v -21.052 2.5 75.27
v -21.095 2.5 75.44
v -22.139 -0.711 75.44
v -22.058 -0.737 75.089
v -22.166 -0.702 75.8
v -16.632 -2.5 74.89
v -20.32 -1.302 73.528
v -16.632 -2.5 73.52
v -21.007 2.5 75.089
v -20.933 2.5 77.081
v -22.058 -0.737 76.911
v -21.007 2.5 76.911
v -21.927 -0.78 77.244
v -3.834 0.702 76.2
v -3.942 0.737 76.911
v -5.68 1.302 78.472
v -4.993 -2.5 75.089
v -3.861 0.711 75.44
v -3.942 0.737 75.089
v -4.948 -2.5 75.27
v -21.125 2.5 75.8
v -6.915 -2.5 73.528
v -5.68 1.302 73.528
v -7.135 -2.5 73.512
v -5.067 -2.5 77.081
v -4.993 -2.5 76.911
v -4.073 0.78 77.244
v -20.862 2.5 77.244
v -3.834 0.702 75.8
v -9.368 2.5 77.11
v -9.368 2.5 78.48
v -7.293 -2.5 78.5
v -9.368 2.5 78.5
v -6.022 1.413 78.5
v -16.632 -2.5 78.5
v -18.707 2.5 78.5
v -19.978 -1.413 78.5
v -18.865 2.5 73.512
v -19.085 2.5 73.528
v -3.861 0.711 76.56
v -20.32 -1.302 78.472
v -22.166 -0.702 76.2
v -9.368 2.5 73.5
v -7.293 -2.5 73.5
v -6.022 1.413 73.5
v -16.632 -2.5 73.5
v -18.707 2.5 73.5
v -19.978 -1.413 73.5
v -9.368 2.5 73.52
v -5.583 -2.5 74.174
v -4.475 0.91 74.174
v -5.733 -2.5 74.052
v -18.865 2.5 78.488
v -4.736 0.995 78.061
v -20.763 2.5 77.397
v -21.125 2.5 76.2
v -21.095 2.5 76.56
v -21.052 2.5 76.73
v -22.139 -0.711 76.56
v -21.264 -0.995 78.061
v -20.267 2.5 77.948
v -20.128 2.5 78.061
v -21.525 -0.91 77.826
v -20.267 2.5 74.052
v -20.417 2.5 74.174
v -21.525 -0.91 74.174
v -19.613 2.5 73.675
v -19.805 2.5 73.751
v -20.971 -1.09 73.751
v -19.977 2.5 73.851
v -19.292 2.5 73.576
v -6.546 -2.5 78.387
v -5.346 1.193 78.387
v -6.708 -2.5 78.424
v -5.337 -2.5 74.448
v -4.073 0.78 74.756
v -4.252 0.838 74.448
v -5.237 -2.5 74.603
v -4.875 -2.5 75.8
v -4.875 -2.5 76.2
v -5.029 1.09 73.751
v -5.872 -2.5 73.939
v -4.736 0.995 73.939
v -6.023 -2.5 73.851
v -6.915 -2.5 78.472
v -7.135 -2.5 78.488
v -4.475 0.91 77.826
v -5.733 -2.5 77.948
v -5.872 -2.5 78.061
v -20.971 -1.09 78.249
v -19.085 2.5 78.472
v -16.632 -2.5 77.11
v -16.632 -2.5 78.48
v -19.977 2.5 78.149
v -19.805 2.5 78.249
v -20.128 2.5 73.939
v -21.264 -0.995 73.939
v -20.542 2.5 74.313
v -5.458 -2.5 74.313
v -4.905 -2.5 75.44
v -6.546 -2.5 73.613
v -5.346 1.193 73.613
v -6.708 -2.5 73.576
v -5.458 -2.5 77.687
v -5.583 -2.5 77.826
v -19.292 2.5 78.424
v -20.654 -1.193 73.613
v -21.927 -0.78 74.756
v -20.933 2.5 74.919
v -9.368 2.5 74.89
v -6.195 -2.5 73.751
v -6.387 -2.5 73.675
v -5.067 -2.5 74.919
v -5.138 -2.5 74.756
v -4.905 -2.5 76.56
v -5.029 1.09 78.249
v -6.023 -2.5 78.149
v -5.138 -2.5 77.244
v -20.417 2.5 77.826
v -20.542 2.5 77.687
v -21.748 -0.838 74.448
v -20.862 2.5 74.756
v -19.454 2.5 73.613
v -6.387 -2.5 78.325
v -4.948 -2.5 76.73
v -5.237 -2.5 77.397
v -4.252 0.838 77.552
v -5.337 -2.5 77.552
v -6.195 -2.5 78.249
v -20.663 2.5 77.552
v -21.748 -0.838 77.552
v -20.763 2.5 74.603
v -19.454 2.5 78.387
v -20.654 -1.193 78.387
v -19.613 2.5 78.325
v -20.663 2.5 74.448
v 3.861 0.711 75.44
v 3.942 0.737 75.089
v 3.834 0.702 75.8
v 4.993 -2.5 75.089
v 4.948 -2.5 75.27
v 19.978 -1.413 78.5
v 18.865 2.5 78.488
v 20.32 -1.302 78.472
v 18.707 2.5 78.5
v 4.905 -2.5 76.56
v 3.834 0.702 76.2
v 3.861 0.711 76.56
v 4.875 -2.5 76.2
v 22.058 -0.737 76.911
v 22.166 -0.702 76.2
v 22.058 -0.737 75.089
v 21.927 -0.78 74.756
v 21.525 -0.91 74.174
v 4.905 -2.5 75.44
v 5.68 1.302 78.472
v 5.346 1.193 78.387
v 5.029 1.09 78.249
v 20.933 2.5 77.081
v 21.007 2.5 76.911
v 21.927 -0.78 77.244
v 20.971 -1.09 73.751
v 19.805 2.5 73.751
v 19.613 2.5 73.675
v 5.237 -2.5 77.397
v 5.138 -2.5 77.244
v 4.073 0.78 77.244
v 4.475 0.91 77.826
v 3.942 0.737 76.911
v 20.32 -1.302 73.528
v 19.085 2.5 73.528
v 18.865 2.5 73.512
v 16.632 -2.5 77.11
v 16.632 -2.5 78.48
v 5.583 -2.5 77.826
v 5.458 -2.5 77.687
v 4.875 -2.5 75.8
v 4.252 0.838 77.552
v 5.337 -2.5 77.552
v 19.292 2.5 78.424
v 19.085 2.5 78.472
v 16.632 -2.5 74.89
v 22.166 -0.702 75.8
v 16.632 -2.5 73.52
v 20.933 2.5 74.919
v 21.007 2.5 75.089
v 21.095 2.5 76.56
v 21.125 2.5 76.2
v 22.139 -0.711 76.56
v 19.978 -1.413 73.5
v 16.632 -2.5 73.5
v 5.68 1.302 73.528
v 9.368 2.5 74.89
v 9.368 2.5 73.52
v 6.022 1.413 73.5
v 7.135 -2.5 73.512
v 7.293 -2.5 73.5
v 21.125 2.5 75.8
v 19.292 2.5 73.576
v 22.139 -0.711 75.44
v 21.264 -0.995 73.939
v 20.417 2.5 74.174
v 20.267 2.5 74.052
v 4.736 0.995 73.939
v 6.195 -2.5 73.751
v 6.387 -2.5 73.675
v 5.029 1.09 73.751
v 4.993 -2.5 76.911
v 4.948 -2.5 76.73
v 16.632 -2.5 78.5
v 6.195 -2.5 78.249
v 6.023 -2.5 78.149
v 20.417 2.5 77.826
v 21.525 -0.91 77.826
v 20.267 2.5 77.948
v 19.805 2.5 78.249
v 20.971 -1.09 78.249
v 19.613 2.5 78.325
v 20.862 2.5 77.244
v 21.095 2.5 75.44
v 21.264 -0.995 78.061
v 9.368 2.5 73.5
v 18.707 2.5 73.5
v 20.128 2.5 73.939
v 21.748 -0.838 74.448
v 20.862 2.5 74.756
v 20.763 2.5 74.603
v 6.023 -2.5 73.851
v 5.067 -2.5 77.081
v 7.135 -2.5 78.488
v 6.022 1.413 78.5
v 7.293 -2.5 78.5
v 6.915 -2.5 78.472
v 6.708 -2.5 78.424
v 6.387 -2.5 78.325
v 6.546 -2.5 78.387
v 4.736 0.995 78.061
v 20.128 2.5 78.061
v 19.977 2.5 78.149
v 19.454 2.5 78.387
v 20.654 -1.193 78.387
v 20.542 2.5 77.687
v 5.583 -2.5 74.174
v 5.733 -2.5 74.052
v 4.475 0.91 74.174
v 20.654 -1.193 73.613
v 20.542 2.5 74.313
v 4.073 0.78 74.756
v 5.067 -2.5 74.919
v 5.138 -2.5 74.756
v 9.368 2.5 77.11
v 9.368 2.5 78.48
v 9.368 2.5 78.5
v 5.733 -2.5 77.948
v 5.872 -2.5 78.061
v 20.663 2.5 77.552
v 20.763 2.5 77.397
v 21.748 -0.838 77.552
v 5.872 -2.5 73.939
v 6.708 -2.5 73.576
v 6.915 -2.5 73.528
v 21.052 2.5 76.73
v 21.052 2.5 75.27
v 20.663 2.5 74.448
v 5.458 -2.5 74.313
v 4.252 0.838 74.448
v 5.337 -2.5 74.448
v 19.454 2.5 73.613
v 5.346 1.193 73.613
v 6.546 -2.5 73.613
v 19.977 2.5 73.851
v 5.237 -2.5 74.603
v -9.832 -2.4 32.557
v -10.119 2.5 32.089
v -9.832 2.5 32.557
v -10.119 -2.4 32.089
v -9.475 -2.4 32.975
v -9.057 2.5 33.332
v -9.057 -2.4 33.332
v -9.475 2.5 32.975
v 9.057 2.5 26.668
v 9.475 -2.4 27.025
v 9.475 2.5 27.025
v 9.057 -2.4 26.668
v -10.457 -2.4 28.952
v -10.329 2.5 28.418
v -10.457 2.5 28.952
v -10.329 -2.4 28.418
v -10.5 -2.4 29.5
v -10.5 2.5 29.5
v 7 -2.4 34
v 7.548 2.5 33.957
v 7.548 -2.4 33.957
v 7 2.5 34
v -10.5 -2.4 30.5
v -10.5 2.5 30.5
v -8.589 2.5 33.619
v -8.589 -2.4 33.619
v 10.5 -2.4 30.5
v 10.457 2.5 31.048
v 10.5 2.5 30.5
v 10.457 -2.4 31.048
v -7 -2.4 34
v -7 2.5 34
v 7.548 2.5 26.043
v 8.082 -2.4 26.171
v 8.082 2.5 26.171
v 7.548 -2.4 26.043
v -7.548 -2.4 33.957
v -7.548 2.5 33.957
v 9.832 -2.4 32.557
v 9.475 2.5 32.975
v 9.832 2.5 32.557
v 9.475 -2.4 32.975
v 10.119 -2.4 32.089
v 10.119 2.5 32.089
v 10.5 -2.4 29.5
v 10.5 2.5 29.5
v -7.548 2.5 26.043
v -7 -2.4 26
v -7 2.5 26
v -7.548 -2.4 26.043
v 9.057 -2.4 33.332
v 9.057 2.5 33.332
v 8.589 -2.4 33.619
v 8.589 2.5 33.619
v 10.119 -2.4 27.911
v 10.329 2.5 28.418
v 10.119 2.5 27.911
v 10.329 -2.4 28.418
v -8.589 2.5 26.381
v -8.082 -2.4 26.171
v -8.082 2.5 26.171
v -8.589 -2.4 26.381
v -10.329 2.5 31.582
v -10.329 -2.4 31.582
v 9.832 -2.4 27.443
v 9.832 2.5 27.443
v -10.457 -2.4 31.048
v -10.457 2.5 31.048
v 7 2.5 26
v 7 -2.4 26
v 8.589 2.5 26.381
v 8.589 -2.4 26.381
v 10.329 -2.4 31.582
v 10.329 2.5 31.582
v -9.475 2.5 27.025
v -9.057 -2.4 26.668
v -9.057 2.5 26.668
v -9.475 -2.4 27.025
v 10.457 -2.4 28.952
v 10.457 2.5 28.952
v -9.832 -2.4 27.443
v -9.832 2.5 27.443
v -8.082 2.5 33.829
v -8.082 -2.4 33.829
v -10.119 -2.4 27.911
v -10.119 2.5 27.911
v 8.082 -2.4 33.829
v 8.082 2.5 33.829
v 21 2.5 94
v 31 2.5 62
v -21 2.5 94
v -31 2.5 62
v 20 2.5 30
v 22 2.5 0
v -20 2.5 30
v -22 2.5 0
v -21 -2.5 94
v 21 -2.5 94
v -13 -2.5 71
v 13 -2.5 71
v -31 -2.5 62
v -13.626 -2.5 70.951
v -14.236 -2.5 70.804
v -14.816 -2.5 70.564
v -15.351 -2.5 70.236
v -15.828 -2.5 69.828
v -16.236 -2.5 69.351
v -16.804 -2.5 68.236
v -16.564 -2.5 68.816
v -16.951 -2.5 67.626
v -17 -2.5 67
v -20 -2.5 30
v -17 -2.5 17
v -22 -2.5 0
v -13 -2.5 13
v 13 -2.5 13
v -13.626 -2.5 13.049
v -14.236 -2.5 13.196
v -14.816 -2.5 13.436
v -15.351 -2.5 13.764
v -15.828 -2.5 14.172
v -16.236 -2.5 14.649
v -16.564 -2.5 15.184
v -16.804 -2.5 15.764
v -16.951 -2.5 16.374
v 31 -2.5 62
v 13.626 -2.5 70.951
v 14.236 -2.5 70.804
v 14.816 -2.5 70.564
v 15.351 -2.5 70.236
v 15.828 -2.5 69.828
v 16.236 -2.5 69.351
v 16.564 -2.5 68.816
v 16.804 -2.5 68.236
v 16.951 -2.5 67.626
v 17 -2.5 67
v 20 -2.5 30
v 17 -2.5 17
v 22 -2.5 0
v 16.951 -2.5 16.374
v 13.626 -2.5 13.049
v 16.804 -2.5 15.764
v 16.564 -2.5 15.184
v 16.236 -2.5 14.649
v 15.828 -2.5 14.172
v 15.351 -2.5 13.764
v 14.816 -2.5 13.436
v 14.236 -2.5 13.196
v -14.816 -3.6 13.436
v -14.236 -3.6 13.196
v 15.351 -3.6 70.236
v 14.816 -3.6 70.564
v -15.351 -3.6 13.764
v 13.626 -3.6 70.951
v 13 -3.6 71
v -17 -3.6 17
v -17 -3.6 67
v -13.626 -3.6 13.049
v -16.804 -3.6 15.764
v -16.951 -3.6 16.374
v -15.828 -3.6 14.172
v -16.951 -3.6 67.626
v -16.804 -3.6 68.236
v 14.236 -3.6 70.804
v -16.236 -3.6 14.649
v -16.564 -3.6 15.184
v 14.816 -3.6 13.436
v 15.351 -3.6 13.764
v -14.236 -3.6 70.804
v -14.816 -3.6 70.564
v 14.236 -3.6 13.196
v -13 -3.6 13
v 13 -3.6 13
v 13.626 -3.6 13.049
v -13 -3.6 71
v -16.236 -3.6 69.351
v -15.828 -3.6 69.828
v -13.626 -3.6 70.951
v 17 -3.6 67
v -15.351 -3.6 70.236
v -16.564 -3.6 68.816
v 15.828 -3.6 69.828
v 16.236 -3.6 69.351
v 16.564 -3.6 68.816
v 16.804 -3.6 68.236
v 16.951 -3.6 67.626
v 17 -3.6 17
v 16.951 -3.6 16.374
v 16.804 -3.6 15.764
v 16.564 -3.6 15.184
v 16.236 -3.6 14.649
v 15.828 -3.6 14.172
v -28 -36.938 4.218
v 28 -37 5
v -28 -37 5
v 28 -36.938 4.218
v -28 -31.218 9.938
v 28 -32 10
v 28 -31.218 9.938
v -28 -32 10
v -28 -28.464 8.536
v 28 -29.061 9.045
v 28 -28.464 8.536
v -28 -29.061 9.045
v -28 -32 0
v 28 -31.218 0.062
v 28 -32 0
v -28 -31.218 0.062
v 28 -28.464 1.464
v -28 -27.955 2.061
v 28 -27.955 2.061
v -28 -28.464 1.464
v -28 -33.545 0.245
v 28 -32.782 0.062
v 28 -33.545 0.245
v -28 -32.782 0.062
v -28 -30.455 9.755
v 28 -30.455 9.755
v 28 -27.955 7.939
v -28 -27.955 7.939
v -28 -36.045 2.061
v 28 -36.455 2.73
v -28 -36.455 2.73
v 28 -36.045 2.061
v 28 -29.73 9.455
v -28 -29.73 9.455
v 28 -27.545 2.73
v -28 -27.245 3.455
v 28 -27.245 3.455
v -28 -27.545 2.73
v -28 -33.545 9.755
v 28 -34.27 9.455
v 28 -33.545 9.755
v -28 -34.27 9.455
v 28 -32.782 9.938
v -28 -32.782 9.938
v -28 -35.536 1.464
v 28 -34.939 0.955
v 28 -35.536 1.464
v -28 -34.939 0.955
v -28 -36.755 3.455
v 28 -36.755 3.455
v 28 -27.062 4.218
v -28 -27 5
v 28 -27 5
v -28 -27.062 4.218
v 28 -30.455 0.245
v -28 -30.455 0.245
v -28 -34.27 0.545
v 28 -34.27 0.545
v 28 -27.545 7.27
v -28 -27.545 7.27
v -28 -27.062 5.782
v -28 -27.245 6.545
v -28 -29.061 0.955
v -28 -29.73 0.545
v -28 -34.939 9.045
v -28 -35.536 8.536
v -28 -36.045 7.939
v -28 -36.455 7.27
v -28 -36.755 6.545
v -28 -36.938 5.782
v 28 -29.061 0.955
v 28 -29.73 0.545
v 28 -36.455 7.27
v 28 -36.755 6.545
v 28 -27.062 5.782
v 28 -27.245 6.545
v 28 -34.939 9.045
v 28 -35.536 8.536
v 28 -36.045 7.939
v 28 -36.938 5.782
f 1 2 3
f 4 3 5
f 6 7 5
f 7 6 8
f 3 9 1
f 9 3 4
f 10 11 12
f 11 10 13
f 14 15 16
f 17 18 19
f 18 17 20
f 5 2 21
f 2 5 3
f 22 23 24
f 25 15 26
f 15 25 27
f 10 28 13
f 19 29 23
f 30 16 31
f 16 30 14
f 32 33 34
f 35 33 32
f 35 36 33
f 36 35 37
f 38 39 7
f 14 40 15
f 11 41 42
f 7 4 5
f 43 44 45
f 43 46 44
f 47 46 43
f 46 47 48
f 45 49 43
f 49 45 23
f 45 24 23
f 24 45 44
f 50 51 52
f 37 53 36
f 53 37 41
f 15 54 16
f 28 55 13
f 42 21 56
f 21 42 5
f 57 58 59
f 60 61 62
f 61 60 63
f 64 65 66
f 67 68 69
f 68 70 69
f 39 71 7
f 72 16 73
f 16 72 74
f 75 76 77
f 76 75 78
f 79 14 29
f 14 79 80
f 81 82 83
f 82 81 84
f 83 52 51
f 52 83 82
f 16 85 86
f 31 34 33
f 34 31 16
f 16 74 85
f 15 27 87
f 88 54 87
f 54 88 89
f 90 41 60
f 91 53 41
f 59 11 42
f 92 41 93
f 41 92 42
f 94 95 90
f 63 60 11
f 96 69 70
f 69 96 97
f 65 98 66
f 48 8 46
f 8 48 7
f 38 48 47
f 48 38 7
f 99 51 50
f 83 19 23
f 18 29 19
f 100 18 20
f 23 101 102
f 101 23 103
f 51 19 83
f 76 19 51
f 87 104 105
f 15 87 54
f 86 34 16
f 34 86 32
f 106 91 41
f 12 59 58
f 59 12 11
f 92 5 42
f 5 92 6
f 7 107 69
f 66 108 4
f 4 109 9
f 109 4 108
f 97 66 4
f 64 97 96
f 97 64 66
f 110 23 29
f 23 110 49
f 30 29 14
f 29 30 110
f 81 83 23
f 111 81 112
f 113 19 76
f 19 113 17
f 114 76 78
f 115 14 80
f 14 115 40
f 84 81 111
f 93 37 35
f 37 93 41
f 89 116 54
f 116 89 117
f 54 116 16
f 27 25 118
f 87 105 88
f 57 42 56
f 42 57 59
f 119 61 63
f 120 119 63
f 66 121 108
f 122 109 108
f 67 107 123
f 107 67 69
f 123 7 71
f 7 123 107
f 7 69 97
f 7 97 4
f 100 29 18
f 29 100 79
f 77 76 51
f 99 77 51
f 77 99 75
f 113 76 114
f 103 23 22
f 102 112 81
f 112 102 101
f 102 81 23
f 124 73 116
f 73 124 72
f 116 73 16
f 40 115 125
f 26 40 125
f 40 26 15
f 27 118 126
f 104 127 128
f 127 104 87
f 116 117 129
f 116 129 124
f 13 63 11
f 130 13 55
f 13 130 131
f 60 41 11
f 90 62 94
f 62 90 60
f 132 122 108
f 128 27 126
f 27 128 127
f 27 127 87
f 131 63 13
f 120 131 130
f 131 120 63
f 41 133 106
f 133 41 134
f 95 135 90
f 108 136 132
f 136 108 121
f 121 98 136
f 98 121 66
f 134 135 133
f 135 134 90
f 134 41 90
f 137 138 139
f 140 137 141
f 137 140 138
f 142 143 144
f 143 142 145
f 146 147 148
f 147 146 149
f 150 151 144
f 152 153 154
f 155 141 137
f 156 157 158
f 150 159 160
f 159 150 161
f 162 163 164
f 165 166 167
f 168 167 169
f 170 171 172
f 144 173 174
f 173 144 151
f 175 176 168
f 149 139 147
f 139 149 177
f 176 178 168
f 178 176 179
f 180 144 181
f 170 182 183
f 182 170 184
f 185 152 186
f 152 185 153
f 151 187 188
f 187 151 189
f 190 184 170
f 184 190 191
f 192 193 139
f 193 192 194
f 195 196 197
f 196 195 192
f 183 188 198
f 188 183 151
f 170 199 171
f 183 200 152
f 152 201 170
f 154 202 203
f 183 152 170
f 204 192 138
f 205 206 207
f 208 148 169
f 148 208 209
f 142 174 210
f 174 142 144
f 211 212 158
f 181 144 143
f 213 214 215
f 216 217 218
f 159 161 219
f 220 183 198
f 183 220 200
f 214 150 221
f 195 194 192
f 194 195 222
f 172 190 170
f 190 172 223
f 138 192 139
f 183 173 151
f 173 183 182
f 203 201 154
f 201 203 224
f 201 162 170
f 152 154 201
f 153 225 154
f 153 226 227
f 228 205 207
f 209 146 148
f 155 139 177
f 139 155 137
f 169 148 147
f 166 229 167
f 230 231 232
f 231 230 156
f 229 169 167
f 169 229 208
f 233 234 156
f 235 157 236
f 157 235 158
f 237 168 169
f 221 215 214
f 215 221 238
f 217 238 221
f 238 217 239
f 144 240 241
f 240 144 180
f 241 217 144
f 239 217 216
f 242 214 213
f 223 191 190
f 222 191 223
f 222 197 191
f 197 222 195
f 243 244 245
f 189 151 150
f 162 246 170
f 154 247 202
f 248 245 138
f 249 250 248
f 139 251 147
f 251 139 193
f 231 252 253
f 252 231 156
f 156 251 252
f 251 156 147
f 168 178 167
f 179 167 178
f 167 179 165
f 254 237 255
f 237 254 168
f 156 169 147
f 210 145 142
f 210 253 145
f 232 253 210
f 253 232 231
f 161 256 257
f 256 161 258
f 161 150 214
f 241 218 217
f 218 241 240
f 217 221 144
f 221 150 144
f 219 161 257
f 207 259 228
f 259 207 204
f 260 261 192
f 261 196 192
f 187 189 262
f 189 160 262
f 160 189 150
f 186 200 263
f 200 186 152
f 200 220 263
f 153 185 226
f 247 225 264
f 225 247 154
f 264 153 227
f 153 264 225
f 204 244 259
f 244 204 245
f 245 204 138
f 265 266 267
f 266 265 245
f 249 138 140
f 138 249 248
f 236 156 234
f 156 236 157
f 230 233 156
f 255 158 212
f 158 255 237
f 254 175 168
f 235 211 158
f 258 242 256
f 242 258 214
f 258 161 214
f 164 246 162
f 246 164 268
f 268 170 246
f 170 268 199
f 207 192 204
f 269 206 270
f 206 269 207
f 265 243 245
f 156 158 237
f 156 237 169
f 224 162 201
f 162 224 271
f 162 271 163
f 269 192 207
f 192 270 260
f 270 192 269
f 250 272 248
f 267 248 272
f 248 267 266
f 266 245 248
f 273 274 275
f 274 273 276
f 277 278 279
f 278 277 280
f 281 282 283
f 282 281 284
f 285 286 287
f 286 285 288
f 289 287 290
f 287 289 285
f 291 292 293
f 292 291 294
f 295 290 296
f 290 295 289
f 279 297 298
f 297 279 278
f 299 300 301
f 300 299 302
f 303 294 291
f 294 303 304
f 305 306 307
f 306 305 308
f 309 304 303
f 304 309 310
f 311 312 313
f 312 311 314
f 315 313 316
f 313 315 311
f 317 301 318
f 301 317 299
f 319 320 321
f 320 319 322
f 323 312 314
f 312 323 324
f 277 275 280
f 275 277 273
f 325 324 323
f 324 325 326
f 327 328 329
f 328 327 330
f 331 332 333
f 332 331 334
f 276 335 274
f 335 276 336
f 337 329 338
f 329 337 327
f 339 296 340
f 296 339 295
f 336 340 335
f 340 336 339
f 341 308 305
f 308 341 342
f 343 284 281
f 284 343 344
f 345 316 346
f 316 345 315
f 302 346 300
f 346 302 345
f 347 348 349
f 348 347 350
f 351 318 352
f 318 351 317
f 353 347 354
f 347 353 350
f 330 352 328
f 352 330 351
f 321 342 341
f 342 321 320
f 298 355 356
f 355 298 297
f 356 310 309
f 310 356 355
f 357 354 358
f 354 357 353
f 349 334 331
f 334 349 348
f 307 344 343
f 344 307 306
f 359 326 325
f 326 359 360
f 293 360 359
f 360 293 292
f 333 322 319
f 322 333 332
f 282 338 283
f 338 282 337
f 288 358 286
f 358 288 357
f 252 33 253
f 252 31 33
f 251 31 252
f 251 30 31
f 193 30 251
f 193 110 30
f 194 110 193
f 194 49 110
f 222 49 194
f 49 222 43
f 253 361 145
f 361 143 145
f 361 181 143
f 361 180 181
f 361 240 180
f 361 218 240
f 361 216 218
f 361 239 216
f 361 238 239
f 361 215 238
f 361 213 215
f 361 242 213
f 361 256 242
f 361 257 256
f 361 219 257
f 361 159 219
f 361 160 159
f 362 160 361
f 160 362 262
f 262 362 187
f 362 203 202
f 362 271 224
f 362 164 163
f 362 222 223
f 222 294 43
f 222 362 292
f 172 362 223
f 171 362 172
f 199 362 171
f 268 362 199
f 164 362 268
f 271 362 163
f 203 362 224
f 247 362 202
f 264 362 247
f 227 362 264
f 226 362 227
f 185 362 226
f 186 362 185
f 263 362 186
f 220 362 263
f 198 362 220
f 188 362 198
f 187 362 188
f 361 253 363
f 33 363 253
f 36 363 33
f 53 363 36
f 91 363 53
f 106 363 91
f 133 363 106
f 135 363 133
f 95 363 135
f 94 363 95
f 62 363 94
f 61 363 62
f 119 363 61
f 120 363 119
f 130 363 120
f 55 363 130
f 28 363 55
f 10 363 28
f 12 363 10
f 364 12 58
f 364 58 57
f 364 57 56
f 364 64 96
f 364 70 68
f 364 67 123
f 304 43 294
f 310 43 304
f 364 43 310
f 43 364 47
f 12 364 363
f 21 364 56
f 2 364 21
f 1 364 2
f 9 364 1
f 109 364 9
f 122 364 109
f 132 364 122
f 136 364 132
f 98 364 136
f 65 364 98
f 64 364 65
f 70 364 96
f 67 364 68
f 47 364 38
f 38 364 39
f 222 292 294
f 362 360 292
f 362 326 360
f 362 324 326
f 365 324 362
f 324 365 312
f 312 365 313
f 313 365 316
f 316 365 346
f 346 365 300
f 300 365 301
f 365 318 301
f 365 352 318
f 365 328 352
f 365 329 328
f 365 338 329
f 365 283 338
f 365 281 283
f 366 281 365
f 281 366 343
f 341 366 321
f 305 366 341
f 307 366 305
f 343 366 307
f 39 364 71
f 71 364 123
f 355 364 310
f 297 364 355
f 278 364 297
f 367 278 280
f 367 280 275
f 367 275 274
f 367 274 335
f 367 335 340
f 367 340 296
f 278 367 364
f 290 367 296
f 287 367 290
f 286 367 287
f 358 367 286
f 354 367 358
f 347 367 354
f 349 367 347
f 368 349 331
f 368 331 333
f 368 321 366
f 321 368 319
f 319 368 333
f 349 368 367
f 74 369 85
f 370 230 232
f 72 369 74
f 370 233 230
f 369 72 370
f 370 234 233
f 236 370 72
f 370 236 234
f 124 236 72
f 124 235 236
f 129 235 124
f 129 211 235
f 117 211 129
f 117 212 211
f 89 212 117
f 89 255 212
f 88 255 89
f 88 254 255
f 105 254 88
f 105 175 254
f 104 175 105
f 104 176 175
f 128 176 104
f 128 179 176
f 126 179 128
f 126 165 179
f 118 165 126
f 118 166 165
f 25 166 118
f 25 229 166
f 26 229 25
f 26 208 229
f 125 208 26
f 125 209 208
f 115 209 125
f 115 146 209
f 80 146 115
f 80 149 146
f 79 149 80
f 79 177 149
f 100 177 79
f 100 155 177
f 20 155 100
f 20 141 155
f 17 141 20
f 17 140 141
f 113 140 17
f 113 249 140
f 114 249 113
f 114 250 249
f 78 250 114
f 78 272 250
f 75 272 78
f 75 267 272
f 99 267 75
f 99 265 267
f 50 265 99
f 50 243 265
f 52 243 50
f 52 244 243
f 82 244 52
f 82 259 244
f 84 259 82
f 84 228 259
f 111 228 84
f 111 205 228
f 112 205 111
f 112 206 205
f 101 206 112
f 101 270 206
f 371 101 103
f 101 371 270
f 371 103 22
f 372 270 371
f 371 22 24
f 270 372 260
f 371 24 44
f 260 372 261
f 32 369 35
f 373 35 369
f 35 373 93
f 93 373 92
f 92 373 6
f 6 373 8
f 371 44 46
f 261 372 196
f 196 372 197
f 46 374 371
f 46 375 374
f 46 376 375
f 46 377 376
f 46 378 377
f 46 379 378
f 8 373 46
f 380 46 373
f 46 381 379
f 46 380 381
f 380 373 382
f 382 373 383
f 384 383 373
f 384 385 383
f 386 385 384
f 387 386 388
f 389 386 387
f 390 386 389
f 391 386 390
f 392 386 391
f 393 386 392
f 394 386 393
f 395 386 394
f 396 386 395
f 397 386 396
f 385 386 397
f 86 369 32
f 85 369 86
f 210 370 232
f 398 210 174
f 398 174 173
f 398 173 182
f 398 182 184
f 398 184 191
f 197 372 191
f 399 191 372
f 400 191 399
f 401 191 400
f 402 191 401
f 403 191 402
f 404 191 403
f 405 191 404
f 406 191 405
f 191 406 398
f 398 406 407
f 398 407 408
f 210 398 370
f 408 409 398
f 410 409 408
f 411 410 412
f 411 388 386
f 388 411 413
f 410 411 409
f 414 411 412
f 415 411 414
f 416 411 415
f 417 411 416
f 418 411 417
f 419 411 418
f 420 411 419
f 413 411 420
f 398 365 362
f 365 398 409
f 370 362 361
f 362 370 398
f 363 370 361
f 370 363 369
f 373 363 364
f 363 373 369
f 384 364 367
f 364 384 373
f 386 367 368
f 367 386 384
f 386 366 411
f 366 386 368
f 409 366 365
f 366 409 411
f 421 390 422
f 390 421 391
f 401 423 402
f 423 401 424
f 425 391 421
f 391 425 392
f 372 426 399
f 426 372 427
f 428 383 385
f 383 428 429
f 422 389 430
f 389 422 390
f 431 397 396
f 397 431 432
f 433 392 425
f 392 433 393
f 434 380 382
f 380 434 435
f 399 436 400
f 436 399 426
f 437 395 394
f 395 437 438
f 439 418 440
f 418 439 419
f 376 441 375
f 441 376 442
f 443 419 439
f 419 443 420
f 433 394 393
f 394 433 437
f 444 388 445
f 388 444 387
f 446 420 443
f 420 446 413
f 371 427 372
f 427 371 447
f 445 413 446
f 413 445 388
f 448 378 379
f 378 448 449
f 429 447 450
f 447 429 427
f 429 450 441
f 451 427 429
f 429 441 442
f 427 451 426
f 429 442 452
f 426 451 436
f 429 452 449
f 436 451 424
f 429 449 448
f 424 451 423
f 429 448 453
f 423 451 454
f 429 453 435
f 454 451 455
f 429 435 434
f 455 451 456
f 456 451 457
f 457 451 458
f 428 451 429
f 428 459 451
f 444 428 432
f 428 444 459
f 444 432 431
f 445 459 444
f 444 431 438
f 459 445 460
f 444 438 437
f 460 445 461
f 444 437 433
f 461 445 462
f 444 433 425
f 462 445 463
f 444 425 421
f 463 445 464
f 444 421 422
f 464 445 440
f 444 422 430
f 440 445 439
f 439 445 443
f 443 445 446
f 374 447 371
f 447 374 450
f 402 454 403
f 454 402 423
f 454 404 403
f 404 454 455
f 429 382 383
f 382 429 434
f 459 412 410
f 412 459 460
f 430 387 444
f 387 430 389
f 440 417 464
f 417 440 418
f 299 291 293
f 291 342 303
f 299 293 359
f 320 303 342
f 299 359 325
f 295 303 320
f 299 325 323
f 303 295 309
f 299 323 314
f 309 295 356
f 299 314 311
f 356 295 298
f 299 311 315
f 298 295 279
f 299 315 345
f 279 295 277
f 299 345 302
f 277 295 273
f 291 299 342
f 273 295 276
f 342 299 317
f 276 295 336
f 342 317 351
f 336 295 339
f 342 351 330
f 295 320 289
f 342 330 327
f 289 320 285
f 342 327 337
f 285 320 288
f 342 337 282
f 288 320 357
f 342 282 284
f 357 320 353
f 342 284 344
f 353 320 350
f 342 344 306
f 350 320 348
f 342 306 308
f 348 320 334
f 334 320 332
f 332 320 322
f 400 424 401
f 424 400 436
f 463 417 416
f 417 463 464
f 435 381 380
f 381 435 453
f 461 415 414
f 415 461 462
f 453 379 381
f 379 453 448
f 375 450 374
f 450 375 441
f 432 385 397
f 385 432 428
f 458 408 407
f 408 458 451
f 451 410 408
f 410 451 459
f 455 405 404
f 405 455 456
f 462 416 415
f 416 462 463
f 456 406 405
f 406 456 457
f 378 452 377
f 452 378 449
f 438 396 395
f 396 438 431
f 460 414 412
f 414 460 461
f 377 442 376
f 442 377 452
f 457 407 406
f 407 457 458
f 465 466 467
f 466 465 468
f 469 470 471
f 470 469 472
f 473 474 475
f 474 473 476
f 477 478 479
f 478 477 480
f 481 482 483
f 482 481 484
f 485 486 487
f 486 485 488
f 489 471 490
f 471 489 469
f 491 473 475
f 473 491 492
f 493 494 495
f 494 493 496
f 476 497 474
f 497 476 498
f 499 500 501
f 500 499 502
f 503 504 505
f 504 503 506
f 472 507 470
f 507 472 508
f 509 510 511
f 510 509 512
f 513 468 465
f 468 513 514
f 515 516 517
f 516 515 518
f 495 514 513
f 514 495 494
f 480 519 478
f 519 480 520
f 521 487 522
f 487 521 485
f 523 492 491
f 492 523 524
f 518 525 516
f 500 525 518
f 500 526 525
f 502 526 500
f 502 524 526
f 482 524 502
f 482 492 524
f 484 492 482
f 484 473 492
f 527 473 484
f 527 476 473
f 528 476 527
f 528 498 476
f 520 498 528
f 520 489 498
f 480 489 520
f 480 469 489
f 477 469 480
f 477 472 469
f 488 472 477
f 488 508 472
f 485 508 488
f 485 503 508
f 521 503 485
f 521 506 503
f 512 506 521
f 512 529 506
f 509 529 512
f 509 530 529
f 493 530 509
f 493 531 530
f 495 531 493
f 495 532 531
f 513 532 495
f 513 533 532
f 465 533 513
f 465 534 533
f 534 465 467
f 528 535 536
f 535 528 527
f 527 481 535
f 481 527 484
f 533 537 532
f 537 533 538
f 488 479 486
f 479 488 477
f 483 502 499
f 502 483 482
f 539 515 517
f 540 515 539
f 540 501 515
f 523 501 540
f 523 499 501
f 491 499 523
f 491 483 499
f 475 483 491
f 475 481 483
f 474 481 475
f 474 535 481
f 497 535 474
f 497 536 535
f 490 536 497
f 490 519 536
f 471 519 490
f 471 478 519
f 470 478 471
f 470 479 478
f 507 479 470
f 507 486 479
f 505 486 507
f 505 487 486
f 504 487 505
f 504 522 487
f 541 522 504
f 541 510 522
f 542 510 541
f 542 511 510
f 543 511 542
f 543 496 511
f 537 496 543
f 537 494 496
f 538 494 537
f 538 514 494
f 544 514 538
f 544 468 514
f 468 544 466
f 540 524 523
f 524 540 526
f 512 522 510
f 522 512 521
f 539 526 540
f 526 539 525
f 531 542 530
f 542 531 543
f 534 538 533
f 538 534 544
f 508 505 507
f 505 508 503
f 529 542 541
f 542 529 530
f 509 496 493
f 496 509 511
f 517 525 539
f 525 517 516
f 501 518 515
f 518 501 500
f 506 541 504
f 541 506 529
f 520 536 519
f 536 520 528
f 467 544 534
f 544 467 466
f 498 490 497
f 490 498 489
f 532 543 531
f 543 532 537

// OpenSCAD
// Stylized bucket seat pattern for OpenSCAD.
// Uses a profile shell, real openings, side bolsters, and a front phone lip.

$fn = 40;

module rounded_rect_2d(size, r) {
    hull()
        for (x = [-size[0] / 2 + r, size[0] / 2 - r])
            for (y = [-size[1] / 2 + r, size[1] / 2 - r])
                translate([x, y])
                    circle(r = r);
}

module xz_plate(thick_y) {
    rotate([90, 0, 0])
        linear_extrude(height = thick_y, center = true)
            children();
}

module backrest_profile_2d() {
    polygon([
        [-22, 0], [-20, 30], [-31, 62], [-21, 94],
        [21, 94], [31, 62], [20, 30], [22, 0]
    ]);
}

module harness_openings(thick = 7) {
    for (sx = [-1, 1])
        translate([sx * 13, 0, 76])
            rotate([0, 0, sx * 18])
                xz_plate(thick)
                    rounded_rect_2d([17, 5], 2.3);

    translate([0, 0, 30])
        xz_plate(thick)
            rounded_rect_2d([21, 8], 3.5);
}

module front_phone_lip(width = 56, height = 10) {
    translate([0, -32, height / 2])
        rotate([0, 90, 0])
            cylinder(d = height, h = width, center = true);
}

module stylized_bucket_seat() {
    difference() {
        xz_plate(5)
            backrest_profile_2d();
        harness_openings(7);
    }

    color("black")
        translate([0, -3, 42])
            xz_plate(1.2)
                rounded_rect_2d([34, 58], 4);

    front_phone_lip();
}

stylized_bucket_seat();
